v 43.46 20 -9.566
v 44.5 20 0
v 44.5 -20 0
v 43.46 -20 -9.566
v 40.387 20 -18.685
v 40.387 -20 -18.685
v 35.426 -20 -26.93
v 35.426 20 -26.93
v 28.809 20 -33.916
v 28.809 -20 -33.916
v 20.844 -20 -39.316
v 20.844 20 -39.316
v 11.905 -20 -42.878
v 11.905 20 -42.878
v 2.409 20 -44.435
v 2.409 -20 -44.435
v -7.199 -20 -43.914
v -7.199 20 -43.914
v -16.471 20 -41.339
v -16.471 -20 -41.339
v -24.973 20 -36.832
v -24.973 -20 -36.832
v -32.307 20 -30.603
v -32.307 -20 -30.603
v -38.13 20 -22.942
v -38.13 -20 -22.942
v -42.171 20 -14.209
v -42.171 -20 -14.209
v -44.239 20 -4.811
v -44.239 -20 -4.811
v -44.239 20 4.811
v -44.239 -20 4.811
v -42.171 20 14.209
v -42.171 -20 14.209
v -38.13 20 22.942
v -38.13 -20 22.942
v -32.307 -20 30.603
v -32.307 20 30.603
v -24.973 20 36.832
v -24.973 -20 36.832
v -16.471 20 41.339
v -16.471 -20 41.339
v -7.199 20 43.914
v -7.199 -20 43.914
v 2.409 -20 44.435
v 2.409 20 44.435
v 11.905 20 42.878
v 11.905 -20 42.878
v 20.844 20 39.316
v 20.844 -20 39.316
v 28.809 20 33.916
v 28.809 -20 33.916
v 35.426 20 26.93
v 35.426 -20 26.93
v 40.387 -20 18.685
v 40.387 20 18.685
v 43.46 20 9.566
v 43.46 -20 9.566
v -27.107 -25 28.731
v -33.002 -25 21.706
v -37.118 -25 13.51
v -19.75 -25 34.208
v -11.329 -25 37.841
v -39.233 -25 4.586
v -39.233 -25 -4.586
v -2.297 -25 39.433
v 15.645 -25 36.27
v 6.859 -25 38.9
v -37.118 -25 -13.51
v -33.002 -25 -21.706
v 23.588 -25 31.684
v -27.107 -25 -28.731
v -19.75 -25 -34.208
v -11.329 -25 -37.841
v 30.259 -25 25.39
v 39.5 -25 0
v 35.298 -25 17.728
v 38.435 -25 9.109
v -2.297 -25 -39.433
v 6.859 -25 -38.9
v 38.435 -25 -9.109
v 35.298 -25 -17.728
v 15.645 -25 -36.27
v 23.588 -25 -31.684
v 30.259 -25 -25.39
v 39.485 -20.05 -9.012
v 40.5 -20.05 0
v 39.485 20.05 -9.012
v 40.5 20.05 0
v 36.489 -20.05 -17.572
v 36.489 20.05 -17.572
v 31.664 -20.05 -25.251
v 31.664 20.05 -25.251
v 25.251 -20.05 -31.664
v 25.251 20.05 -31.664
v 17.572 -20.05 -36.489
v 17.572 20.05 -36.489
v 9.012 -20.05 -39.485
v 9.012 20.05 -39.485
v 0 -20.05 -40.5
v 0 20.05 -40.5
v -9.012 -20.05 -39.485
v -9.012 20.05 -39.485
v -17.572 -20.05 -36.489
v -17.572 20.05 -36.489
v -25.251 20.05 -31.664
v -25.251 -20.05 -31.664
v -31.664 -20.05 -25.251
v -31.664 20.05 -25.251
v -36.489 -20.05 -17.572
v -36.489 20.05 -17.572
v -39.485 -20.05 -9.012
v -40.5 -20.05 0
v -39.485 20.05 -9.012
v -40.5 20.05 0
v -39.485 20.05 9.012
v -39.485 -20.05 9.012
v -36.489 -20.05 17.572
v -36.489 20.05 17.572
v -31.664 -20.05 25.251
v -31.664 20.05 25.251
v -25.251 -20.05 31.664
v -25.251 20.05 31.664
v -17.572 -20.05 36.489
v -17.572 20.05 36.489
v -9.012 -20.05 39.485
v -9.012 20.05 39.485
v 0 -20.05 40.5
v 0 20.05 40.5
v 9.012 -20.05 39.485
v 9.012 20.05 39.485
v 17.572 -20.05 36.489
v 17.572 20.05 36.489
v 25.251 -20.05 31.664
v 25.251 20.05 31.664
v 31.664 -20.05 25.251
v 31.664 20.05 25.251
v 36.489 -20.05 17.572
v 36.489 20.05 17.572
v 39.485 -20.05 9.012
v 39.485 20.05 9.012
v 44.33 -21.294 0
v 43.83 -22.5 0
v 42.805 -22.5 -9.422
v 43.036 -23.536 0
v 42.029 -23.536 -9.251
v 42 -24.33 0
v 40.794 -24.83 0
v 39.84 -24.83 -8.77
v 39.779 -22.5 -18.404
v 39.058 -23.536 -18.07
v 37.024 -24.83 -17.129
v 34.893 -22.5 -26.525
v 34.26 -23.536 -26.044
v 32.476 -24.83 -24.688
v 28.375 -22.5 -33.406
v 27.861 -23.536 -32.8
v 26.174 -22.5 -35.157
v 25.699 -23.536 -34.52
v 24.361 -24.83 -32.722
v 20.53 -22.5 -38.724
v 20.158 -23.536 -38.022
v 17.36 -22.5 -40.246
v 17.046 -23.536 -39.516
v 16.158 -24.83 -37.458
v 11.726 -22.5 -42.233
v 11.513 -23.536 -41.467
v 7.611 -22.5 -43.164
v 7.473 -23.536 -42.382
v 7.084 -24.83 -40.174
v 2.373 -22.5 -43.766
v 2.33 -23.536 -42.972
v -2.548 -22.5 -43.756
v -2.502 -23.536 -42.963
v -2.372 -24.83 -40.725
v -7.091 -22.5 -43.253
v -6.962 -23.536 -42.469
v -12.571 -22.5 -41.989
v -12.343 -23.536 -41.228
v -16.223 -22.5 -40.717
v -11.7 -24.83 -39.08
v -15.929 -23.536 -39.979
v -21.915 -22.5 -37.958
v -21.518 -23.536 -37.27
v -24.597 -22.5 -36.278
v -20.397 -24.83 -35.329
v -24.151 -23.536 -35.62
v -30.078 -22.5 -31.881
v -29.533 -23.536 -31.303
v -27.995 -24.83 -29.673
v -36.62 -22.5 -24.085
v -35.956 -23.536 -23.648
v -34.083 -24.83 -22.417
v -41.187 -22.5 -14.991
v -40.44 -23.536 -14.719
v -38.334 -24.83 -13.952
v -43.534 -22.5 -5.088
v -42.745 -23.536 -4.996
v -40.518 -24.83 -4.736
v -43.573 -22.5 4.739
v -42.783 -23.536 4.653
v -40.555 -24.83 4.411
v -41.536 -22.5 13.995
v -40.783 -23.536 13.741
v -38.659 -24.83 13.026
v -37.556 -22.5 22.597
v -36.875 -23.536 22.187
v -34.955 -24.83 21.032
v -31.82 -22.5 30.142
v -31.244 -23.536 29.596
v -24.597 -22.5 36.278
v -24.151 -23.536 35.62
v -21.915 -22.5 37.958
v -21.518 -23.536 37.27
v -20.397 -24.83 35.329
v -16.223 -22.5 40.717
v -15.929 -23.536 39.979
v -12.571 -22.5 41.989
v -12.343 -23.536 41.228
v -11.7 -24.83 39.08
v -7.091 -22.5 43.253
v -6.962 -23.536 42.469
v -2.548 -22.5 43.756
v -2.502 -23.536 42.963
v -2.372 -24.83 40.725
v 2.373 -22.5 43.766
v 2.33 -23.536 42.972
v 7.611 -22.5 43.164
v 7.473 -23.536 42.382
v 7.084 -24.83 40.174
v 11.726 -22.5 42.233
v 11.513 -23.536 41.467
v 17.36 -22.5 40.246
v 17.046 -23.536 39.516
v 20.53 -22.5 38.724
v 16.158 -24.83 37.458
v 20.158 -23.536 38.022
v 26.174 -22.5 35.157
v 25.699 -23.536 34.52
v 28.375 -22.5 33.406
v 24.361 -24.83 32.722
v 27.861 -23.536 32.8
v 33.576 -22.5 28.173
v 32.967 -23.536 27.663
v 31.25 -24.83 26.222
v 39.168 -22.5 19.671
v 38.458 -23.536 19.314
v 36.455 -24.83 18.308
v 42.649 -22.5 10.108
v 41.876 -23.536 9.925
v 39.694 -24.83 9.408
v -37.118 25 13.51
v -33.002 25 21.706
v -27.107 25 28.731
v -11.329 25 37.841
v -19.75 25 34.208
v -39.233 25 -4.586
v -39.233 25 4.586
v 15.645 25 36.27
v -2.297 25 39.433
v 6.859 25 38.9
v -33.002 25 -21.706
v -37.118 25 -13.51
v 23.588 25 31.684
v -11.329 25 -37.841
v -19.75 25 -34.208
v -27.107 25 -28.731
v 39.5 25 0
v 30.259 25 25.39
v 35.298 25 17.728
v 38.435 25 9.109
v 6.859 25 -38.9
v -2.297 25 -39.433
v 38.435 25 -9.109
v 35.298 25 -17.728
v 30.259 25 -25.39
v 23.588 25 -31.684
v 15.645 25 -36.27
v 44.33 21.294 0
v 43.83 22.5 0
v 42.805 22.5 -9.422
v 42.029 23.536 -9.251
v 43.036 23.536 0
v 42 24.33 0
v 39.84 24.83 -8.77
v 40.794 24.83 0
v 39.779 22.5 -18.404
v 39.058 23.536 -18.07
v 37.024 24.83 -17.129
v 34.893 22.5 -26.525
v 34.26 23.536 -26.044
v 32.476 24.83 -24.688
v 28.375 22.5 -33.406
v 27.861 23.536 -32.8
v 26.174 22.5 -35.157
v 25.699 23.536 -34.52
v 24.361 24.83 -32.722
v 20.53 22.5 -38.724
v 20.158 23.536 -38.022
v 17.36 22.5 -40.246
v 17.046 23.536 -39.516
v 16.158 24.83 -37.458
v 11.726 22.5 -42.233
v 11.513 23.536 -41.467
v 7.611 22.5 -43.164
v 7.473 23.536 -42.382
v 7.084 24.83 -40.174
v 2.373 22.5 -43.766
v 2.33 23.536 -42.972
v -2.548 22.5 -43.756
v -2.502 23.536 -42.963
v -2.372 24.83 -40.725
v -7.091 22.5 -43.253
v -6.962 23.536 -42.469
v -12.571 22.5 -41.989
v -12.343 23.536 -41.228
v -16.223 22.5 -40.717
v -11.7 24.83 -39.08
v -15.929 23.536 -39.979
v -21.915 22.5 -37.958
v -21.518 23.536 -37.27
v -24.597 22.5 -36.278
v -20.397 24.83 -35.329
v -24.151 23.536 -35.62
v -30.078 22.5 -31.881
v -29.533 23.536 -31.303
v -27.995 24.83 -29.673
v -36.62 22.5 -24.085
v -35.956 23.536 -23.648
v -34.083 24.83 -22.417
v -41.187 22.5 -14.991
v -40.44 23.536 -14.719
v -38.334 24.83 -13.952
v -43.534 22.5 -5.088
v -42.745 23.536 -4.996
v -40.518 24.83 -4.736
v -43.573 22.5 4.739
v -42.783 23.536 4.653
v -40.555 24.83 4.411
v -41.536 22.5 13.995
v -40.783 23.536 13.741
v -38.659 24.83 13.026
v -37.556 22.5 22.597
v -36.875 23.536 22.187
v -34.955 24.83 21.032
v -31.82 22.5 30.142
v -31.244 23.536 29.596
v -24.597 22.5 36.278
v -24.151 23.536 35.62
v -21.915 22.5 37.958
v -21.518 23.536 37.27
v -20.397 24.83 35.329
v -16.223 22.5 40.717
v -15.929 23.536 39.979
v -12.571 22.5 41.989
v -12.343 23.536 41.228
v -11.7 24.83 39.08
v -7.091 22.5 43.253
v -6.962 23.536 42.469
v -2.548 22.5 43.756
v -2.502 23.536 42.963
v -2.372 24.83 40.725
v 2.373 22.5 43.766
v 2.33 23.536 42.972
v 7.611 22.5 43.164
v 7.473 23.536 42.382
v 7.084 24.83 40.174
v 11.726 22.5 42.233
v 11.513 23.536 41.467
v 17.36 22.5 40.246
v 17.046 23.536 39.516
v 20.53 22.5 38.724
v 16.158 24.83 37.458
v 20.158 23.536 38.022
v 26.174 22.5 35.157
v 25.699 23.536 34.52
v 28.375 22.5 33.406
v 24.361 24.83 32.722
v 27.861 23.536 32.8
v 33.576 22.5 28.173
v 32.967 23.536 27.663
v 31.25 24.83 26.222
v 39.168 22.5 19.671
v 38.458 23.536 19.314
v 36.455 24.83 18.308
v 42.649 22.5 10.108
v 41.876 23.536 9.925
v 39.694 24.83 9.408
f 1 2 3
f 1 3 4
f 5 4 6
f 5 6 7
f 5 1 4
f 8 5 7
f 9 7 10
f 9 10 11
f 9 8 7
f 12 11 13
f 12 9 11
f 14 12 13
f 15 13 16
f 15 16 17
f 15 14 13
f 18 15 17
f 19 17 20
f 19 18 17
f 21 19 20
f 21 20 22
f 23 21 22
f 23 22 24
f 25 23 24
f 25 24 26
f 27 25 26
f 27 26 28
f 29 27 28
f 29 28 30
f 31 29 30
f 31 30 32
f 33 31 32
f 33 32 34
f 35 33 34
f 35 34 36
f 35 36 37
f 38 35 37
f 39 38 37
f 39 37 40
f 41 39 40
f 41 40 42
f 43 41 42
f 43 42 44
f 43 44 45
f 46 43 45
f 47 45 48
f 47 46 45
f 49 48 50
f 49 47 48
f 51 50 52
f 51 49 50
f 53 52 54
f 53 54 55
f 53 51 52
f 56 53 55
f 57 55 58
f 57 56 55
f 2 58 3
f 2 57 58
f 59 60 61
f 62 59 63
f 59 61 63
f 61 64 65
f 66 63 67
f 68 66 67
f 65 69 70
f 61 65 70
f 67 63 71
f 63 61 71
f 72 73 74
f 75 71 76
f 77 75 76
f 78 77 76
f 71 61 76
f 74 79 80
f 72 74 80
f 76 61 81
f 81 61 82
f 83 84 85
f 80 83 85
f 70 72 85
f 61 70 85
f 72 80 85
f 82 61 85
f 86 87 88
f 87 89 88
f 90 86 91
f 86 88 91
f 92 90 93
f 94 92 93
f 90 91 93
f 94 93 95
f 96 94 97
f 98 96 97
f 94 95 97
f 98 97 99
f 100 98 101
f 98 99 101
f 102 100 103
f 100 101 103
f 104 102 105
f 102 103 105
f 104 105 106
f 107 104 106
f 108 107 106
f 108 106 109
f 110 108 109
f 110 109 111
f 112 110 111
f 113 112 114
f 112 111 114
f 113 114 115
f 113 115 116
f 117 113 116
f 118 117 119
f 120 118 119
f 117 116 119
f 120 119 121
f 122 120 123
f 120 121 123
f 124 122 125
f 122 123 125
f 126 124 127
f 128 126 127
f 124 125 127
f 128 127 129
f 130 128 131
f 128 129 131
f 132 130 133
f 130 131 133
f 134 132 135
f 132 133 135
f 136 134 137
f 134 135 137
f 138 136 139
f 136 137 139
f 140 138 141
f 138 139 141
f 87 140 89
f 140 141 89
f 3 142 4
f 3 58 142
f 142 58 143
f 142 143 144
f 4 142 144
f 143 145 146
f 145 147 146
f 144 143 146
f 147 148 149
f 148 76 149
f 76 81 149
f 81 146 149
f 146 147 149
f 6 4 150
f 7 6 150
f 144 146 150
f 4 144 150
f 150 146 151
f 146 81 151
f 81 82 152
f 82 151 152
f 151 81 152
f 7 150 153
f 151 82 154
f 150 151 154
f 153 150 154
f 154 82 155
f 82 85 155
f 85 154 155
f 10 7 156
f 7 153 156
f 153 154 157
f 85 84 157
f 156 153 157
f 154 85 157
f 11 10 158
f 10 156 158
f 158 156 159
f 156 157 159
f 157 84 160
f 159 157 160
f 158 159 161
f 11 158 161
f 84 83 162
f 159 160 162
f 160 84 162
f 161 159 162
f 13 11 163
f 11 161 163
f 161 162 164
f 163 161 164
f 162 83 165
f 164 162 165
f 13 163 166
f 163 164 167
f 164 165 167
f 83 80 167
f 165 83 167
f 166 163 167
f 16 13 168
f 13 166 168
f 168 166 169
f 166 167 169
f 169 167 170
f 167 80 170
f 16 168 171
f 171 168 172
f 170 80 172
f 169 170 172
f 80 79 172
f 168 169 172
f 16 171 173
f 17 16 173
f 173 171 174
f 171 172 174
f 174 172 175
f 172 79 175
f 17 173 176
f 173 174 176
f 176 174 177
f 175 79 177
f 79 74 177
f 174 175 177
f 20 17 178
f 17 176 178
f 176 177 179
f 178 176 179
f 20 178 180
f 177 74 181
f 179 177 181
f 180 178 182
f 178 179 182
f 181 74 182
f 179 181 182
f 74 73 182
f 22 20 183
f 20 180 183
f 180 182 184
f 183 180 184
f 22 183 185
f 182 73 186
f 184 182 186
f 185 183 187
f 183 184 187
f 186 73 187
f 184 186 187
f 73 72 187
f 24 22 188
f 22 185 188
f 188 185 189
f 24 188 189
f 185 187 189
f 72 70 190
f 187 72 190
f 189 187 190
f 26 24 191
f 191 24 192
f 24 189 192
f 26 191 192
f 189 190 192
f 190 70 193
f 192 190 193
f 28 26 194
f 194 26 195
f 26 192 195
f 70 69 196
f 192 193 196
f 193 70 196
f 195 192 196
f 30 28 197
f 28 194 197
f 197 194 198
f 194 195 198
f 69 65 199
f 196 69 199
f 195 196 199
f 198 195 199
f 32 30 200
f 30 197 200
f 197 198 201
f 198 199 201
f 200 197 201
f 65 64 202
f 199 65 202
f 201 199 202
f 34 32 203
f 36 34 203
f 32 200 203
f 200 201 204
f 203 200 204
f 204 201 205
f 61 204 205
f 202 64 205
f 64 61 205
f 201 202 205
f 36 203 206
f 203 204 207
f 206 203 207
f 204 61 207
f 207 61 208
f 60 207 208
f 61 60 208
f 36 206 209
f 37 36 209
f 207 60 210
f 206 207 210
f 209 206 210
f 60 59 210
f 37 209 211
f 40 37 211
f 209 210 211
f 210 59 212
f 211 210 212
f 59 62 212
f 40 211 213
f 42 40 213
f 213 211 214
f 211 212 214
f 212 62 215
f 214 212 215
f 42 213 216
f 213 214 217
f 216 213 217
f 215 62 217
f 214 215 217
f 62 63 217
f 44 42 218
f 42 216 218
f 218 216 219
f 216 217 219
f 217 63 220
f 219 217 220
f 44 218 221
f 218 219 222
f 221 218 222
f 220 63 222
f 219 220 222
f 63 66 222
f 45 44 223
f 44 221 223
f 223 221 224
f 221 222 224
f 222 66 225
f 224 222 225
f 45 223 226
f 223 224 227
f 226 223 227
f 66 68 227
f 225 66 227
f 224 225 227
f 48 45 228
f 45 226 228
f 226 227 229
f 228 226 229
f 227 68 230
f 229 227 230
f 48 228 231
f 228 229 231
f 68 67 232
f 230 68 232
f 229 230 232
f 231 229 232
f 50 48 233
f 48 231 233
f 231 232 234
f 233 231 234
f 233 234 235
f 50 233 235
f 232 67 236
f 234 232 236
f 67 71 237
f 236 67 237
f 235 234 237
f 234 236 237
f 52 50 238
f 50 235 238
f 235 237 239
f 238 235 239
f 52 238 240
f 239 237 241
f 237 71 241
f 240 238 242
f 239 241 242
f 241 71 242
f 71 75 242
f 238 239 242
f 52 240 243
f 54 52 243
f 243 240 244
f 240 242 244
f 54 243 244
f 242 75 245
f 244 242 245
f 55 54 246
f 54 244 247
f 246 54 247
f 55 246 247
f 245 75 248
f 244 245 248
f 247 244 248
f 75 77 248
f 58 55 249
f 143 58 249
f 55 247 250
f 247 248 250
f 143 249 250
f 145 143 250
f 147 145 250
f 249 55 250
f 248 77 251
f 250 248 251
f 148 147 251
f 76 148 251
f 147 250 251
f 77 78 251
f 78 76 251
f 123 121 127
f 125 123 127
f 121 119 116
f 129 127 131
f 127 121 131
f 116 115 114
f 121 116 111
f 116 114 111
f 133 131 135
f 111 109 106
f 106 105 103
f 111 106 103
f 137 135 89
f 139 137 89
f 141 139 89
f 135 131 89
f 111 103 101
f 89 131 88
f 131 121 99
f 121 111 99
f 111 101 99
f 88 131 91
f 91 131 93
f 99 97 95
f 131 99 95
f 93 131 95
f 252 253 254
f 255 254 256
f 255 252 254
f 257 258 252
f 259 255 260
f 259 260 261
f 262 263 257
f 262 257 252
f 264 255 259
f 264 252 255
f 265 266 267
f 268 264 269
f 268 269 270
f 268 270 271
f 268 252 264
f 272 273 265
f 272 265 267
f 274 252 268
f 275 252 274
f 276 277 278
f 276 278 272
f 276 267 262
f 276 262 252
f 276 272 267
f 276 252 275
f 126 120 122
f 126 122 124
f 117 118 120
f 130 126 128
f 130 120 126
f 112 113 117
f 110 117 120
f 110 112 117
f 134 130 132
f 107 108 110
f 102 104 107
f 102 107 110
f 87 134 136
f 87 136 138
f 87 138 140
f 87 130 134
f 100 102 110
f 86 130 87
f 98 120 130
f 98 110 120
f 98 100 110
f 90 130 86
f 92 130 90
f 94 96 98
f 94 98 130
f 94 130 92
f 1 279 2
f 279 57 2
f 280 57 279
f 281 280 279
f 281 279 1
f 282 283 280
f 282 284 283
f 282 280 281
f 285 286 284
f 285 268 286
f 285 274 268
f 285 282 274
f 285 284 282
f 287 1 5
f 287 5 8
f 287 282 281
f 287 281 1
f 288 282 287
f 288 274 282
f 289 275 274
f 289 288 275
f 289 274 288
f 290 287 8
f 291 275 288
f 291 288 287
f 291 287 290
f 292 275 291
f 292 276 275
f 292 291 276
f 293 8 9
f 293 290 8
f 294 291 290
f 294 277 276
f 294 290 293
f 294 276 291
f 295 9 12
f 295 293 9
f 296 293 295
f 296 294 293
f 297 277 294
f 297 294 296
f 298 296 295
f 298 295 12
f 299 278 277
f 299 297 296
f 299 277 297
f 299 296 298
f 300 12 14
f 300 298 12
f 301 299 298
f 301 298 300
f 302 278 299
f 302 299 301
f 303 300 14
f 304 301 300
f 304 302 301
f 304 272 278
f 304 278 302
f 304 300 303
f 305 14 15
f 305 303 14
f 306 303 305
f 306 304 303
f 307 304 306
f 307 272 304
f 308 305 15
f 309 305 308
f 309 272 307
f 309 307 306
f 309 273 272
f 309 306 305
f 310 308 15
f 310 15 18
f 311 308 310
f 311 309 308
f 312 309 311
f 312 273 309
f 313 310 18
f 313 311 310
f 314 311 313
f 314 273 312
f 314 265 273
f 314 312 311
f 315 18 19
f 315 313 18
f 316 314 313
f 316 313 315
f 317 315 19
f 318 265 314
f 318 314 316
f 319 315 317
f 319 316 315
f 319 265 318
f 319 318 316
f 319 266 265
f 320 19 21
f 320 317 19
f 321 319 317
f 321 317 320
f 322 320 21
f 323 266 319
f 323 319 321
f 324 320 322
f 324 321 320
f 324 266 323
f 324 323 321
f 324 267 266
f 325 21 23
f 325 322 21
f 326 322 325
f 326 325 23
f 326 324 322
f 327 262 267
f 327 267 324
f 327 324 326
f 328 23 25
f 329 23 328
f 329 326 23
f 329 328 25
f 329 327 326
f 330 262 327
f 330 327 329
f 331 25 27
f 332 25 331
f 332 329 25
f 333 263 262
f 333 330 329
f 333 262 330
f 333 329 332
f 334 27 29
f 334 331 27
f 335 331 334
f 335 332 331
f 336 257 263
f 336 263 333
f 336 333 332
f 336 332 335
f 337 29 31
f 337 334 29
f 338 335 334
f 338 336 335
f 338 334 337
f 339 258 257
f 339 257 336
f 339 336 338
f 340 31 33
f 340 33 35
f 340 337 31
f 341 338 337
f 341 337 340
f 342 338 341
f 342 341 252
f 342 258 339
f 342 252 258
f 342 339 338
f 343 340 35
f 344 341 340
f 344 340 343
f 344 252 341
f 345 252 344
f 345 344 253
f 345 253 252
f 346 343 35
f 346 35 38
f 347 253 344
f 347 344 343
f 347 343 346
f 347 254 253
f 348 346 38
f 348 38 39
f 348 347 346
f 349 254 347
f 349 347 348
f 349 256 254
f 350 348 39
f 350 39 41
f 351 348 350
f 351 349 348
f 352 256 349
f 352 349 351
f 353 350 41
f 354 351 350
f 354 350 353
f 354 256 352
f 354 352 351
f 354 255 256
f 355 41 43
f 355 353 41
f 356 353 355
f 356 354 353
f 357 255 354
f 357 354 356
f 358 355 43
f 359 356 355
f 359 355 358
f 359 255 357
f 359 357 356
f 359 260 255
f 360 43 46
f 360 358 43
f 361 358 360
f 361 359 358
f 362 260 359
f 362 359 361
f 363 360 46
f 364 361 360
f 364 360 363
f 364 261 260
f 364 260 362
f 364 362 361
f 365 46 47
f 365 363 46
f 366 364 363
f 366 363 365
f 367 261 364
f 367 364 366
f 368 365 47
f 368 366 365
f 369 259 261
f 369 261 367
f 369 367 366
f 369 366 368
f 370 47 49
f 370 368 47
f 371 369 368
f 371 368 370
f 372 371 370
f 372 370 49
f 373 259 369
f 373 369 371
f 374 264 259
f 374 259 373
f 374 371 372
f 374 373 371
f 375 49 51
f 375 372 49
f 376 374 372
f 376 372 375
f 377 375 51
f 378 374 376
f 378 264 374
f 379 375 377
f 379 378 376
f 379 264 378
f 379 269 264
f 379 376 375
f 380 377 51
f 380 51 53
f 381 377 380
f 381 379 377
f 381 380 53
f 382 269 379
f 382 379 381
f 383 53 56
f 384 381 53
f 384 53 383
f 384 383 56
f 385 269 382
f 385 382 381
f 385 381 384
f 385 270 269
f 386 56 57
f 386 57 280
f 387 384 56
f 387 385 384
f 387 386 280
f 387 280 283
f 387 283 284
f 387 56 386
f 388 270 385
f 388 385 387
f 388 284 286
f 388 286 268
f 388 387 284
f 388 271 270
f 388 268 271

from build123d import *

# Parameters (mm, degrees)
SKETCH_1_R          = 44.5
EXTRUDE_1_DEPTH     = 25
FILLET_1_R          = 5
SKETCH_9_R          = 40.5
CUT_EXTRUDE_1_DEPTH = 20.05


with BuildPart() as part:
    # 草图1 → 凸台-拉伸1 (new body, symmetric)
    with BuildSketch(Plane(origin=(0, 0, 0), x_dir=(1, 0, 0), z_dir=(0, 1, 0))):
        Circle(SKETCH_1_R)
    extrude(amount=EXTRUDE_1_DEPTH, both=True)

    # 圆角1
    fillet_1_edges = [part.edges().sort_by_distance(p)[0] for p in [
        (-44.5, -25, 0),
        (-44.5, 25, 0),
    ]]
    fillet(fillet_1_edges, radius=FILLET_1_R)

    # 草图9 → 切除-拉伸1 (cut, symmetric)
    with BuildSketch(Plane(origin=(0, 0, 0), x_dir=(1, 0, 0), z_dir=(0, 1, 0))):
        Circle(SKETCH_9_R)
    extrude(amount=CUT_EXTRUDE_1_DEPTH, both=True, mode=Mode.SUBTRACT)


solid = part.part
